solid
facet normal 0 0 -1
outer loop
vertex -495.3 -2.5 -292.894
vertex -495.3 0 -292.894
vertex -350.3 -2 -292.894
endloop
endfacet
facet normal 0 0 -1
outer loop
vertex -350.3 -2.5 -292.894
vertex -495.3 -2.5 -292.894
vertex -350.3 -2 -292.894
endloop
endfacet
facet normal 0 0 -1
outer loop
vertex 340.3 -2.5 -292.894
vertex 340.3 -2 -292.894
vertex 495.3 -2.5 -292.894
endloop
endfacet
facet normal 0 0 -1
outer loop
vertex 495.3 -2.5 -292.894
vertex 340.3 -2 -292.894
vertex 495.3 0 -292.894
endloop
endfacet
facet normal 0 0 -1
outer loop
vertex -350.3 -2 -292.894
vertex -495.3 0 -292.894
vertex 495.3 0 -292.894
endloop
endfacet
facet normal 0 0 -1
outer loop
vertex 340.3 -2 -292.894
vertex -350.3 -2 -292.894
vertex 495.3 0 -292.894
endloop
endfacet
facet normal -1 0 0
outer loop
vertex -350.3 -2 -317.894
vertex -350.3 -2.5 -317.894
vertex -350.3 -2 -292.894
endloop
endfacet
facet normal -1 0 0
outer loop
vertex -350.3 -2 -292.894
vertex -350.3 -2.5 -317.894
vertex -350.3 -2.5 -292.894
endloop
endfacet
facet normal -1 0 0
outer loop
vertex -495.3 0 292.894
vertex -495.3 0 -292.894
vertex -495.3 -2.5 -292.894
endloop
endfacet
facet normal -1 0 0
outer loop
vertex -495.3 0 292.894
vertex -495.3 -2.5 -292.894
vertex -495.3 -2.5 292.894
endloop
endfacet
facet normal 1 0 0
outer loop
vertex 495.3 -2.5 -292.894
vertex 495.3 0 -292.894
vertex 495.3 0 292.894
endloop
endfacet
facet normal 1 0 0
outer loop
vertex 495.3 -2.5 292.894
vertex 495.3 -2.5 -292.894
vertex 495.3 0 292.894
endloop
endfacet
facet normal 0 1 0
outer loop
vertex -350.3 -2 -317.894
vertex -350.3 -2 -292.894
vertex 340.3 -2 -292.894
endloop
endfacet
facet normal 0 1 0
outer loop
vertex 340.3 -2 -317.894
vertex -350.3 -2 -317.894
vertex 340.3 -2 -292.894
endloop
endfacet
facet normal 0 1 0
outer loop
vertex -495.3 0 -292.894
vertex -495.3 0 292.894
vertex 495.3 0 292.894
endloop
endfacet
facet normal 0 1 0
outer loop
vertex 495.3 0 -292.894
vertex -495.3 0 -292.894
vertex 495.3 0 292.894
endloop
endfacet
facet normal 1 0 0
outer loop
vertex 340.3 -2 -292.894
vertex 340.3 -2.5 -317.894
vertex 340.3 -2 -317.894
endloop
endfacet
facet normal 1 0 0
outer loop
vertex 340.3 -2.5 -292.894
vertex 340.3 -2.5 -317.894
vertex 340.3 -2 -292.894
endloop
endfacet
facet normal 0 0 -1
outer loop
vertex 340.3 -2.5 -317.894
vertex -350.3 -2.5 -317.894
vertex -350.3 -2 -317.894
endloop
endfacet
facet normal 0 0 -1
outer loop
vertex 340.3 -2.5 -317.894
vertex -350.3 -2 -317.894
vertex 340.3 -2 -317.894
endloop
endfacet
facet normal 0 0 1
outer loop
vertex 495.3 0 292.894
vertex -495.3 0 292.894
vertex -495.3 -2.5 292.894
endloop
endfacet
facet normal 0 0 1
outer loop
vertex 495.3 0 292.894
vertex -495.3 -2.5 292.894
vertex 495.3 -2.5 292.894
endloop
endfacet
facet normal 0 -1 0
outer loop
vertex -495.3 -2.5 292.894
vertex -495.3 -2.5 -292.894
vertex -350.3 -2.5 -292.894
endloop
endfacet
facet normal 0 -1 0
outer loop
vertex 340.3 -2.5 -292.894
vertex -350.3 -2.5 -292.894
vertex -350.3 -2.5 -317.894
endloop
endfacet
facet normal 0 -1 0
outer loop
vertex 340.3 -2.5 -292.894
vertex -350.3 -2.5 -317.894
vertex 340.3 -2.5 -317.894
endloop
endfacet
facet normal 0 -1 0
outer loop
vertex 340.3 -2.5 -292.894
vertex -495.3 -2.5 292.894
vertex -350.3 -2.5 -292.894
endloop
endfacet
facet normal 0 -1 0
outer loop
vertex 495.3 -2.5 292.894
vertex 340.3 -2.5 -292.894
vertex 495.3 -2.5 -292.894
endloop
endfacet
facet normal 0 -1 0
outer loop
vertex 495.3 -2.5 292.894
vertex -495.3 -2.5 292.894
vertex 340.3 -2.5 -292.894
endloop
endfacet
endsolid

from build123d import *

# Parameters (mm, degrees)
F0_W     = 990.6
F0_H     = 585.7875
F1_DEPTH = 2.5
F2_W     = 690.6
F2_H     = 25
F3_DEPTH = 0.5


with BuildPart() as f1:
    # F0 (on Front) → F1 (new body)
    with BuildSketch(Plane.XZ):
        Rectangle(F0_W, F0_H)
    extrude(amount=F1_DEPTH)

    # F2 (on face) → F3 (join)
    with BuildSketch(Plane.XZ.offset(2.5)):
        with Locations((-5, -305.39375)):
            Rectangle(F2_W, F2_H)
    extrude(amount=-F3_DEPTH)


solid = f1.part
